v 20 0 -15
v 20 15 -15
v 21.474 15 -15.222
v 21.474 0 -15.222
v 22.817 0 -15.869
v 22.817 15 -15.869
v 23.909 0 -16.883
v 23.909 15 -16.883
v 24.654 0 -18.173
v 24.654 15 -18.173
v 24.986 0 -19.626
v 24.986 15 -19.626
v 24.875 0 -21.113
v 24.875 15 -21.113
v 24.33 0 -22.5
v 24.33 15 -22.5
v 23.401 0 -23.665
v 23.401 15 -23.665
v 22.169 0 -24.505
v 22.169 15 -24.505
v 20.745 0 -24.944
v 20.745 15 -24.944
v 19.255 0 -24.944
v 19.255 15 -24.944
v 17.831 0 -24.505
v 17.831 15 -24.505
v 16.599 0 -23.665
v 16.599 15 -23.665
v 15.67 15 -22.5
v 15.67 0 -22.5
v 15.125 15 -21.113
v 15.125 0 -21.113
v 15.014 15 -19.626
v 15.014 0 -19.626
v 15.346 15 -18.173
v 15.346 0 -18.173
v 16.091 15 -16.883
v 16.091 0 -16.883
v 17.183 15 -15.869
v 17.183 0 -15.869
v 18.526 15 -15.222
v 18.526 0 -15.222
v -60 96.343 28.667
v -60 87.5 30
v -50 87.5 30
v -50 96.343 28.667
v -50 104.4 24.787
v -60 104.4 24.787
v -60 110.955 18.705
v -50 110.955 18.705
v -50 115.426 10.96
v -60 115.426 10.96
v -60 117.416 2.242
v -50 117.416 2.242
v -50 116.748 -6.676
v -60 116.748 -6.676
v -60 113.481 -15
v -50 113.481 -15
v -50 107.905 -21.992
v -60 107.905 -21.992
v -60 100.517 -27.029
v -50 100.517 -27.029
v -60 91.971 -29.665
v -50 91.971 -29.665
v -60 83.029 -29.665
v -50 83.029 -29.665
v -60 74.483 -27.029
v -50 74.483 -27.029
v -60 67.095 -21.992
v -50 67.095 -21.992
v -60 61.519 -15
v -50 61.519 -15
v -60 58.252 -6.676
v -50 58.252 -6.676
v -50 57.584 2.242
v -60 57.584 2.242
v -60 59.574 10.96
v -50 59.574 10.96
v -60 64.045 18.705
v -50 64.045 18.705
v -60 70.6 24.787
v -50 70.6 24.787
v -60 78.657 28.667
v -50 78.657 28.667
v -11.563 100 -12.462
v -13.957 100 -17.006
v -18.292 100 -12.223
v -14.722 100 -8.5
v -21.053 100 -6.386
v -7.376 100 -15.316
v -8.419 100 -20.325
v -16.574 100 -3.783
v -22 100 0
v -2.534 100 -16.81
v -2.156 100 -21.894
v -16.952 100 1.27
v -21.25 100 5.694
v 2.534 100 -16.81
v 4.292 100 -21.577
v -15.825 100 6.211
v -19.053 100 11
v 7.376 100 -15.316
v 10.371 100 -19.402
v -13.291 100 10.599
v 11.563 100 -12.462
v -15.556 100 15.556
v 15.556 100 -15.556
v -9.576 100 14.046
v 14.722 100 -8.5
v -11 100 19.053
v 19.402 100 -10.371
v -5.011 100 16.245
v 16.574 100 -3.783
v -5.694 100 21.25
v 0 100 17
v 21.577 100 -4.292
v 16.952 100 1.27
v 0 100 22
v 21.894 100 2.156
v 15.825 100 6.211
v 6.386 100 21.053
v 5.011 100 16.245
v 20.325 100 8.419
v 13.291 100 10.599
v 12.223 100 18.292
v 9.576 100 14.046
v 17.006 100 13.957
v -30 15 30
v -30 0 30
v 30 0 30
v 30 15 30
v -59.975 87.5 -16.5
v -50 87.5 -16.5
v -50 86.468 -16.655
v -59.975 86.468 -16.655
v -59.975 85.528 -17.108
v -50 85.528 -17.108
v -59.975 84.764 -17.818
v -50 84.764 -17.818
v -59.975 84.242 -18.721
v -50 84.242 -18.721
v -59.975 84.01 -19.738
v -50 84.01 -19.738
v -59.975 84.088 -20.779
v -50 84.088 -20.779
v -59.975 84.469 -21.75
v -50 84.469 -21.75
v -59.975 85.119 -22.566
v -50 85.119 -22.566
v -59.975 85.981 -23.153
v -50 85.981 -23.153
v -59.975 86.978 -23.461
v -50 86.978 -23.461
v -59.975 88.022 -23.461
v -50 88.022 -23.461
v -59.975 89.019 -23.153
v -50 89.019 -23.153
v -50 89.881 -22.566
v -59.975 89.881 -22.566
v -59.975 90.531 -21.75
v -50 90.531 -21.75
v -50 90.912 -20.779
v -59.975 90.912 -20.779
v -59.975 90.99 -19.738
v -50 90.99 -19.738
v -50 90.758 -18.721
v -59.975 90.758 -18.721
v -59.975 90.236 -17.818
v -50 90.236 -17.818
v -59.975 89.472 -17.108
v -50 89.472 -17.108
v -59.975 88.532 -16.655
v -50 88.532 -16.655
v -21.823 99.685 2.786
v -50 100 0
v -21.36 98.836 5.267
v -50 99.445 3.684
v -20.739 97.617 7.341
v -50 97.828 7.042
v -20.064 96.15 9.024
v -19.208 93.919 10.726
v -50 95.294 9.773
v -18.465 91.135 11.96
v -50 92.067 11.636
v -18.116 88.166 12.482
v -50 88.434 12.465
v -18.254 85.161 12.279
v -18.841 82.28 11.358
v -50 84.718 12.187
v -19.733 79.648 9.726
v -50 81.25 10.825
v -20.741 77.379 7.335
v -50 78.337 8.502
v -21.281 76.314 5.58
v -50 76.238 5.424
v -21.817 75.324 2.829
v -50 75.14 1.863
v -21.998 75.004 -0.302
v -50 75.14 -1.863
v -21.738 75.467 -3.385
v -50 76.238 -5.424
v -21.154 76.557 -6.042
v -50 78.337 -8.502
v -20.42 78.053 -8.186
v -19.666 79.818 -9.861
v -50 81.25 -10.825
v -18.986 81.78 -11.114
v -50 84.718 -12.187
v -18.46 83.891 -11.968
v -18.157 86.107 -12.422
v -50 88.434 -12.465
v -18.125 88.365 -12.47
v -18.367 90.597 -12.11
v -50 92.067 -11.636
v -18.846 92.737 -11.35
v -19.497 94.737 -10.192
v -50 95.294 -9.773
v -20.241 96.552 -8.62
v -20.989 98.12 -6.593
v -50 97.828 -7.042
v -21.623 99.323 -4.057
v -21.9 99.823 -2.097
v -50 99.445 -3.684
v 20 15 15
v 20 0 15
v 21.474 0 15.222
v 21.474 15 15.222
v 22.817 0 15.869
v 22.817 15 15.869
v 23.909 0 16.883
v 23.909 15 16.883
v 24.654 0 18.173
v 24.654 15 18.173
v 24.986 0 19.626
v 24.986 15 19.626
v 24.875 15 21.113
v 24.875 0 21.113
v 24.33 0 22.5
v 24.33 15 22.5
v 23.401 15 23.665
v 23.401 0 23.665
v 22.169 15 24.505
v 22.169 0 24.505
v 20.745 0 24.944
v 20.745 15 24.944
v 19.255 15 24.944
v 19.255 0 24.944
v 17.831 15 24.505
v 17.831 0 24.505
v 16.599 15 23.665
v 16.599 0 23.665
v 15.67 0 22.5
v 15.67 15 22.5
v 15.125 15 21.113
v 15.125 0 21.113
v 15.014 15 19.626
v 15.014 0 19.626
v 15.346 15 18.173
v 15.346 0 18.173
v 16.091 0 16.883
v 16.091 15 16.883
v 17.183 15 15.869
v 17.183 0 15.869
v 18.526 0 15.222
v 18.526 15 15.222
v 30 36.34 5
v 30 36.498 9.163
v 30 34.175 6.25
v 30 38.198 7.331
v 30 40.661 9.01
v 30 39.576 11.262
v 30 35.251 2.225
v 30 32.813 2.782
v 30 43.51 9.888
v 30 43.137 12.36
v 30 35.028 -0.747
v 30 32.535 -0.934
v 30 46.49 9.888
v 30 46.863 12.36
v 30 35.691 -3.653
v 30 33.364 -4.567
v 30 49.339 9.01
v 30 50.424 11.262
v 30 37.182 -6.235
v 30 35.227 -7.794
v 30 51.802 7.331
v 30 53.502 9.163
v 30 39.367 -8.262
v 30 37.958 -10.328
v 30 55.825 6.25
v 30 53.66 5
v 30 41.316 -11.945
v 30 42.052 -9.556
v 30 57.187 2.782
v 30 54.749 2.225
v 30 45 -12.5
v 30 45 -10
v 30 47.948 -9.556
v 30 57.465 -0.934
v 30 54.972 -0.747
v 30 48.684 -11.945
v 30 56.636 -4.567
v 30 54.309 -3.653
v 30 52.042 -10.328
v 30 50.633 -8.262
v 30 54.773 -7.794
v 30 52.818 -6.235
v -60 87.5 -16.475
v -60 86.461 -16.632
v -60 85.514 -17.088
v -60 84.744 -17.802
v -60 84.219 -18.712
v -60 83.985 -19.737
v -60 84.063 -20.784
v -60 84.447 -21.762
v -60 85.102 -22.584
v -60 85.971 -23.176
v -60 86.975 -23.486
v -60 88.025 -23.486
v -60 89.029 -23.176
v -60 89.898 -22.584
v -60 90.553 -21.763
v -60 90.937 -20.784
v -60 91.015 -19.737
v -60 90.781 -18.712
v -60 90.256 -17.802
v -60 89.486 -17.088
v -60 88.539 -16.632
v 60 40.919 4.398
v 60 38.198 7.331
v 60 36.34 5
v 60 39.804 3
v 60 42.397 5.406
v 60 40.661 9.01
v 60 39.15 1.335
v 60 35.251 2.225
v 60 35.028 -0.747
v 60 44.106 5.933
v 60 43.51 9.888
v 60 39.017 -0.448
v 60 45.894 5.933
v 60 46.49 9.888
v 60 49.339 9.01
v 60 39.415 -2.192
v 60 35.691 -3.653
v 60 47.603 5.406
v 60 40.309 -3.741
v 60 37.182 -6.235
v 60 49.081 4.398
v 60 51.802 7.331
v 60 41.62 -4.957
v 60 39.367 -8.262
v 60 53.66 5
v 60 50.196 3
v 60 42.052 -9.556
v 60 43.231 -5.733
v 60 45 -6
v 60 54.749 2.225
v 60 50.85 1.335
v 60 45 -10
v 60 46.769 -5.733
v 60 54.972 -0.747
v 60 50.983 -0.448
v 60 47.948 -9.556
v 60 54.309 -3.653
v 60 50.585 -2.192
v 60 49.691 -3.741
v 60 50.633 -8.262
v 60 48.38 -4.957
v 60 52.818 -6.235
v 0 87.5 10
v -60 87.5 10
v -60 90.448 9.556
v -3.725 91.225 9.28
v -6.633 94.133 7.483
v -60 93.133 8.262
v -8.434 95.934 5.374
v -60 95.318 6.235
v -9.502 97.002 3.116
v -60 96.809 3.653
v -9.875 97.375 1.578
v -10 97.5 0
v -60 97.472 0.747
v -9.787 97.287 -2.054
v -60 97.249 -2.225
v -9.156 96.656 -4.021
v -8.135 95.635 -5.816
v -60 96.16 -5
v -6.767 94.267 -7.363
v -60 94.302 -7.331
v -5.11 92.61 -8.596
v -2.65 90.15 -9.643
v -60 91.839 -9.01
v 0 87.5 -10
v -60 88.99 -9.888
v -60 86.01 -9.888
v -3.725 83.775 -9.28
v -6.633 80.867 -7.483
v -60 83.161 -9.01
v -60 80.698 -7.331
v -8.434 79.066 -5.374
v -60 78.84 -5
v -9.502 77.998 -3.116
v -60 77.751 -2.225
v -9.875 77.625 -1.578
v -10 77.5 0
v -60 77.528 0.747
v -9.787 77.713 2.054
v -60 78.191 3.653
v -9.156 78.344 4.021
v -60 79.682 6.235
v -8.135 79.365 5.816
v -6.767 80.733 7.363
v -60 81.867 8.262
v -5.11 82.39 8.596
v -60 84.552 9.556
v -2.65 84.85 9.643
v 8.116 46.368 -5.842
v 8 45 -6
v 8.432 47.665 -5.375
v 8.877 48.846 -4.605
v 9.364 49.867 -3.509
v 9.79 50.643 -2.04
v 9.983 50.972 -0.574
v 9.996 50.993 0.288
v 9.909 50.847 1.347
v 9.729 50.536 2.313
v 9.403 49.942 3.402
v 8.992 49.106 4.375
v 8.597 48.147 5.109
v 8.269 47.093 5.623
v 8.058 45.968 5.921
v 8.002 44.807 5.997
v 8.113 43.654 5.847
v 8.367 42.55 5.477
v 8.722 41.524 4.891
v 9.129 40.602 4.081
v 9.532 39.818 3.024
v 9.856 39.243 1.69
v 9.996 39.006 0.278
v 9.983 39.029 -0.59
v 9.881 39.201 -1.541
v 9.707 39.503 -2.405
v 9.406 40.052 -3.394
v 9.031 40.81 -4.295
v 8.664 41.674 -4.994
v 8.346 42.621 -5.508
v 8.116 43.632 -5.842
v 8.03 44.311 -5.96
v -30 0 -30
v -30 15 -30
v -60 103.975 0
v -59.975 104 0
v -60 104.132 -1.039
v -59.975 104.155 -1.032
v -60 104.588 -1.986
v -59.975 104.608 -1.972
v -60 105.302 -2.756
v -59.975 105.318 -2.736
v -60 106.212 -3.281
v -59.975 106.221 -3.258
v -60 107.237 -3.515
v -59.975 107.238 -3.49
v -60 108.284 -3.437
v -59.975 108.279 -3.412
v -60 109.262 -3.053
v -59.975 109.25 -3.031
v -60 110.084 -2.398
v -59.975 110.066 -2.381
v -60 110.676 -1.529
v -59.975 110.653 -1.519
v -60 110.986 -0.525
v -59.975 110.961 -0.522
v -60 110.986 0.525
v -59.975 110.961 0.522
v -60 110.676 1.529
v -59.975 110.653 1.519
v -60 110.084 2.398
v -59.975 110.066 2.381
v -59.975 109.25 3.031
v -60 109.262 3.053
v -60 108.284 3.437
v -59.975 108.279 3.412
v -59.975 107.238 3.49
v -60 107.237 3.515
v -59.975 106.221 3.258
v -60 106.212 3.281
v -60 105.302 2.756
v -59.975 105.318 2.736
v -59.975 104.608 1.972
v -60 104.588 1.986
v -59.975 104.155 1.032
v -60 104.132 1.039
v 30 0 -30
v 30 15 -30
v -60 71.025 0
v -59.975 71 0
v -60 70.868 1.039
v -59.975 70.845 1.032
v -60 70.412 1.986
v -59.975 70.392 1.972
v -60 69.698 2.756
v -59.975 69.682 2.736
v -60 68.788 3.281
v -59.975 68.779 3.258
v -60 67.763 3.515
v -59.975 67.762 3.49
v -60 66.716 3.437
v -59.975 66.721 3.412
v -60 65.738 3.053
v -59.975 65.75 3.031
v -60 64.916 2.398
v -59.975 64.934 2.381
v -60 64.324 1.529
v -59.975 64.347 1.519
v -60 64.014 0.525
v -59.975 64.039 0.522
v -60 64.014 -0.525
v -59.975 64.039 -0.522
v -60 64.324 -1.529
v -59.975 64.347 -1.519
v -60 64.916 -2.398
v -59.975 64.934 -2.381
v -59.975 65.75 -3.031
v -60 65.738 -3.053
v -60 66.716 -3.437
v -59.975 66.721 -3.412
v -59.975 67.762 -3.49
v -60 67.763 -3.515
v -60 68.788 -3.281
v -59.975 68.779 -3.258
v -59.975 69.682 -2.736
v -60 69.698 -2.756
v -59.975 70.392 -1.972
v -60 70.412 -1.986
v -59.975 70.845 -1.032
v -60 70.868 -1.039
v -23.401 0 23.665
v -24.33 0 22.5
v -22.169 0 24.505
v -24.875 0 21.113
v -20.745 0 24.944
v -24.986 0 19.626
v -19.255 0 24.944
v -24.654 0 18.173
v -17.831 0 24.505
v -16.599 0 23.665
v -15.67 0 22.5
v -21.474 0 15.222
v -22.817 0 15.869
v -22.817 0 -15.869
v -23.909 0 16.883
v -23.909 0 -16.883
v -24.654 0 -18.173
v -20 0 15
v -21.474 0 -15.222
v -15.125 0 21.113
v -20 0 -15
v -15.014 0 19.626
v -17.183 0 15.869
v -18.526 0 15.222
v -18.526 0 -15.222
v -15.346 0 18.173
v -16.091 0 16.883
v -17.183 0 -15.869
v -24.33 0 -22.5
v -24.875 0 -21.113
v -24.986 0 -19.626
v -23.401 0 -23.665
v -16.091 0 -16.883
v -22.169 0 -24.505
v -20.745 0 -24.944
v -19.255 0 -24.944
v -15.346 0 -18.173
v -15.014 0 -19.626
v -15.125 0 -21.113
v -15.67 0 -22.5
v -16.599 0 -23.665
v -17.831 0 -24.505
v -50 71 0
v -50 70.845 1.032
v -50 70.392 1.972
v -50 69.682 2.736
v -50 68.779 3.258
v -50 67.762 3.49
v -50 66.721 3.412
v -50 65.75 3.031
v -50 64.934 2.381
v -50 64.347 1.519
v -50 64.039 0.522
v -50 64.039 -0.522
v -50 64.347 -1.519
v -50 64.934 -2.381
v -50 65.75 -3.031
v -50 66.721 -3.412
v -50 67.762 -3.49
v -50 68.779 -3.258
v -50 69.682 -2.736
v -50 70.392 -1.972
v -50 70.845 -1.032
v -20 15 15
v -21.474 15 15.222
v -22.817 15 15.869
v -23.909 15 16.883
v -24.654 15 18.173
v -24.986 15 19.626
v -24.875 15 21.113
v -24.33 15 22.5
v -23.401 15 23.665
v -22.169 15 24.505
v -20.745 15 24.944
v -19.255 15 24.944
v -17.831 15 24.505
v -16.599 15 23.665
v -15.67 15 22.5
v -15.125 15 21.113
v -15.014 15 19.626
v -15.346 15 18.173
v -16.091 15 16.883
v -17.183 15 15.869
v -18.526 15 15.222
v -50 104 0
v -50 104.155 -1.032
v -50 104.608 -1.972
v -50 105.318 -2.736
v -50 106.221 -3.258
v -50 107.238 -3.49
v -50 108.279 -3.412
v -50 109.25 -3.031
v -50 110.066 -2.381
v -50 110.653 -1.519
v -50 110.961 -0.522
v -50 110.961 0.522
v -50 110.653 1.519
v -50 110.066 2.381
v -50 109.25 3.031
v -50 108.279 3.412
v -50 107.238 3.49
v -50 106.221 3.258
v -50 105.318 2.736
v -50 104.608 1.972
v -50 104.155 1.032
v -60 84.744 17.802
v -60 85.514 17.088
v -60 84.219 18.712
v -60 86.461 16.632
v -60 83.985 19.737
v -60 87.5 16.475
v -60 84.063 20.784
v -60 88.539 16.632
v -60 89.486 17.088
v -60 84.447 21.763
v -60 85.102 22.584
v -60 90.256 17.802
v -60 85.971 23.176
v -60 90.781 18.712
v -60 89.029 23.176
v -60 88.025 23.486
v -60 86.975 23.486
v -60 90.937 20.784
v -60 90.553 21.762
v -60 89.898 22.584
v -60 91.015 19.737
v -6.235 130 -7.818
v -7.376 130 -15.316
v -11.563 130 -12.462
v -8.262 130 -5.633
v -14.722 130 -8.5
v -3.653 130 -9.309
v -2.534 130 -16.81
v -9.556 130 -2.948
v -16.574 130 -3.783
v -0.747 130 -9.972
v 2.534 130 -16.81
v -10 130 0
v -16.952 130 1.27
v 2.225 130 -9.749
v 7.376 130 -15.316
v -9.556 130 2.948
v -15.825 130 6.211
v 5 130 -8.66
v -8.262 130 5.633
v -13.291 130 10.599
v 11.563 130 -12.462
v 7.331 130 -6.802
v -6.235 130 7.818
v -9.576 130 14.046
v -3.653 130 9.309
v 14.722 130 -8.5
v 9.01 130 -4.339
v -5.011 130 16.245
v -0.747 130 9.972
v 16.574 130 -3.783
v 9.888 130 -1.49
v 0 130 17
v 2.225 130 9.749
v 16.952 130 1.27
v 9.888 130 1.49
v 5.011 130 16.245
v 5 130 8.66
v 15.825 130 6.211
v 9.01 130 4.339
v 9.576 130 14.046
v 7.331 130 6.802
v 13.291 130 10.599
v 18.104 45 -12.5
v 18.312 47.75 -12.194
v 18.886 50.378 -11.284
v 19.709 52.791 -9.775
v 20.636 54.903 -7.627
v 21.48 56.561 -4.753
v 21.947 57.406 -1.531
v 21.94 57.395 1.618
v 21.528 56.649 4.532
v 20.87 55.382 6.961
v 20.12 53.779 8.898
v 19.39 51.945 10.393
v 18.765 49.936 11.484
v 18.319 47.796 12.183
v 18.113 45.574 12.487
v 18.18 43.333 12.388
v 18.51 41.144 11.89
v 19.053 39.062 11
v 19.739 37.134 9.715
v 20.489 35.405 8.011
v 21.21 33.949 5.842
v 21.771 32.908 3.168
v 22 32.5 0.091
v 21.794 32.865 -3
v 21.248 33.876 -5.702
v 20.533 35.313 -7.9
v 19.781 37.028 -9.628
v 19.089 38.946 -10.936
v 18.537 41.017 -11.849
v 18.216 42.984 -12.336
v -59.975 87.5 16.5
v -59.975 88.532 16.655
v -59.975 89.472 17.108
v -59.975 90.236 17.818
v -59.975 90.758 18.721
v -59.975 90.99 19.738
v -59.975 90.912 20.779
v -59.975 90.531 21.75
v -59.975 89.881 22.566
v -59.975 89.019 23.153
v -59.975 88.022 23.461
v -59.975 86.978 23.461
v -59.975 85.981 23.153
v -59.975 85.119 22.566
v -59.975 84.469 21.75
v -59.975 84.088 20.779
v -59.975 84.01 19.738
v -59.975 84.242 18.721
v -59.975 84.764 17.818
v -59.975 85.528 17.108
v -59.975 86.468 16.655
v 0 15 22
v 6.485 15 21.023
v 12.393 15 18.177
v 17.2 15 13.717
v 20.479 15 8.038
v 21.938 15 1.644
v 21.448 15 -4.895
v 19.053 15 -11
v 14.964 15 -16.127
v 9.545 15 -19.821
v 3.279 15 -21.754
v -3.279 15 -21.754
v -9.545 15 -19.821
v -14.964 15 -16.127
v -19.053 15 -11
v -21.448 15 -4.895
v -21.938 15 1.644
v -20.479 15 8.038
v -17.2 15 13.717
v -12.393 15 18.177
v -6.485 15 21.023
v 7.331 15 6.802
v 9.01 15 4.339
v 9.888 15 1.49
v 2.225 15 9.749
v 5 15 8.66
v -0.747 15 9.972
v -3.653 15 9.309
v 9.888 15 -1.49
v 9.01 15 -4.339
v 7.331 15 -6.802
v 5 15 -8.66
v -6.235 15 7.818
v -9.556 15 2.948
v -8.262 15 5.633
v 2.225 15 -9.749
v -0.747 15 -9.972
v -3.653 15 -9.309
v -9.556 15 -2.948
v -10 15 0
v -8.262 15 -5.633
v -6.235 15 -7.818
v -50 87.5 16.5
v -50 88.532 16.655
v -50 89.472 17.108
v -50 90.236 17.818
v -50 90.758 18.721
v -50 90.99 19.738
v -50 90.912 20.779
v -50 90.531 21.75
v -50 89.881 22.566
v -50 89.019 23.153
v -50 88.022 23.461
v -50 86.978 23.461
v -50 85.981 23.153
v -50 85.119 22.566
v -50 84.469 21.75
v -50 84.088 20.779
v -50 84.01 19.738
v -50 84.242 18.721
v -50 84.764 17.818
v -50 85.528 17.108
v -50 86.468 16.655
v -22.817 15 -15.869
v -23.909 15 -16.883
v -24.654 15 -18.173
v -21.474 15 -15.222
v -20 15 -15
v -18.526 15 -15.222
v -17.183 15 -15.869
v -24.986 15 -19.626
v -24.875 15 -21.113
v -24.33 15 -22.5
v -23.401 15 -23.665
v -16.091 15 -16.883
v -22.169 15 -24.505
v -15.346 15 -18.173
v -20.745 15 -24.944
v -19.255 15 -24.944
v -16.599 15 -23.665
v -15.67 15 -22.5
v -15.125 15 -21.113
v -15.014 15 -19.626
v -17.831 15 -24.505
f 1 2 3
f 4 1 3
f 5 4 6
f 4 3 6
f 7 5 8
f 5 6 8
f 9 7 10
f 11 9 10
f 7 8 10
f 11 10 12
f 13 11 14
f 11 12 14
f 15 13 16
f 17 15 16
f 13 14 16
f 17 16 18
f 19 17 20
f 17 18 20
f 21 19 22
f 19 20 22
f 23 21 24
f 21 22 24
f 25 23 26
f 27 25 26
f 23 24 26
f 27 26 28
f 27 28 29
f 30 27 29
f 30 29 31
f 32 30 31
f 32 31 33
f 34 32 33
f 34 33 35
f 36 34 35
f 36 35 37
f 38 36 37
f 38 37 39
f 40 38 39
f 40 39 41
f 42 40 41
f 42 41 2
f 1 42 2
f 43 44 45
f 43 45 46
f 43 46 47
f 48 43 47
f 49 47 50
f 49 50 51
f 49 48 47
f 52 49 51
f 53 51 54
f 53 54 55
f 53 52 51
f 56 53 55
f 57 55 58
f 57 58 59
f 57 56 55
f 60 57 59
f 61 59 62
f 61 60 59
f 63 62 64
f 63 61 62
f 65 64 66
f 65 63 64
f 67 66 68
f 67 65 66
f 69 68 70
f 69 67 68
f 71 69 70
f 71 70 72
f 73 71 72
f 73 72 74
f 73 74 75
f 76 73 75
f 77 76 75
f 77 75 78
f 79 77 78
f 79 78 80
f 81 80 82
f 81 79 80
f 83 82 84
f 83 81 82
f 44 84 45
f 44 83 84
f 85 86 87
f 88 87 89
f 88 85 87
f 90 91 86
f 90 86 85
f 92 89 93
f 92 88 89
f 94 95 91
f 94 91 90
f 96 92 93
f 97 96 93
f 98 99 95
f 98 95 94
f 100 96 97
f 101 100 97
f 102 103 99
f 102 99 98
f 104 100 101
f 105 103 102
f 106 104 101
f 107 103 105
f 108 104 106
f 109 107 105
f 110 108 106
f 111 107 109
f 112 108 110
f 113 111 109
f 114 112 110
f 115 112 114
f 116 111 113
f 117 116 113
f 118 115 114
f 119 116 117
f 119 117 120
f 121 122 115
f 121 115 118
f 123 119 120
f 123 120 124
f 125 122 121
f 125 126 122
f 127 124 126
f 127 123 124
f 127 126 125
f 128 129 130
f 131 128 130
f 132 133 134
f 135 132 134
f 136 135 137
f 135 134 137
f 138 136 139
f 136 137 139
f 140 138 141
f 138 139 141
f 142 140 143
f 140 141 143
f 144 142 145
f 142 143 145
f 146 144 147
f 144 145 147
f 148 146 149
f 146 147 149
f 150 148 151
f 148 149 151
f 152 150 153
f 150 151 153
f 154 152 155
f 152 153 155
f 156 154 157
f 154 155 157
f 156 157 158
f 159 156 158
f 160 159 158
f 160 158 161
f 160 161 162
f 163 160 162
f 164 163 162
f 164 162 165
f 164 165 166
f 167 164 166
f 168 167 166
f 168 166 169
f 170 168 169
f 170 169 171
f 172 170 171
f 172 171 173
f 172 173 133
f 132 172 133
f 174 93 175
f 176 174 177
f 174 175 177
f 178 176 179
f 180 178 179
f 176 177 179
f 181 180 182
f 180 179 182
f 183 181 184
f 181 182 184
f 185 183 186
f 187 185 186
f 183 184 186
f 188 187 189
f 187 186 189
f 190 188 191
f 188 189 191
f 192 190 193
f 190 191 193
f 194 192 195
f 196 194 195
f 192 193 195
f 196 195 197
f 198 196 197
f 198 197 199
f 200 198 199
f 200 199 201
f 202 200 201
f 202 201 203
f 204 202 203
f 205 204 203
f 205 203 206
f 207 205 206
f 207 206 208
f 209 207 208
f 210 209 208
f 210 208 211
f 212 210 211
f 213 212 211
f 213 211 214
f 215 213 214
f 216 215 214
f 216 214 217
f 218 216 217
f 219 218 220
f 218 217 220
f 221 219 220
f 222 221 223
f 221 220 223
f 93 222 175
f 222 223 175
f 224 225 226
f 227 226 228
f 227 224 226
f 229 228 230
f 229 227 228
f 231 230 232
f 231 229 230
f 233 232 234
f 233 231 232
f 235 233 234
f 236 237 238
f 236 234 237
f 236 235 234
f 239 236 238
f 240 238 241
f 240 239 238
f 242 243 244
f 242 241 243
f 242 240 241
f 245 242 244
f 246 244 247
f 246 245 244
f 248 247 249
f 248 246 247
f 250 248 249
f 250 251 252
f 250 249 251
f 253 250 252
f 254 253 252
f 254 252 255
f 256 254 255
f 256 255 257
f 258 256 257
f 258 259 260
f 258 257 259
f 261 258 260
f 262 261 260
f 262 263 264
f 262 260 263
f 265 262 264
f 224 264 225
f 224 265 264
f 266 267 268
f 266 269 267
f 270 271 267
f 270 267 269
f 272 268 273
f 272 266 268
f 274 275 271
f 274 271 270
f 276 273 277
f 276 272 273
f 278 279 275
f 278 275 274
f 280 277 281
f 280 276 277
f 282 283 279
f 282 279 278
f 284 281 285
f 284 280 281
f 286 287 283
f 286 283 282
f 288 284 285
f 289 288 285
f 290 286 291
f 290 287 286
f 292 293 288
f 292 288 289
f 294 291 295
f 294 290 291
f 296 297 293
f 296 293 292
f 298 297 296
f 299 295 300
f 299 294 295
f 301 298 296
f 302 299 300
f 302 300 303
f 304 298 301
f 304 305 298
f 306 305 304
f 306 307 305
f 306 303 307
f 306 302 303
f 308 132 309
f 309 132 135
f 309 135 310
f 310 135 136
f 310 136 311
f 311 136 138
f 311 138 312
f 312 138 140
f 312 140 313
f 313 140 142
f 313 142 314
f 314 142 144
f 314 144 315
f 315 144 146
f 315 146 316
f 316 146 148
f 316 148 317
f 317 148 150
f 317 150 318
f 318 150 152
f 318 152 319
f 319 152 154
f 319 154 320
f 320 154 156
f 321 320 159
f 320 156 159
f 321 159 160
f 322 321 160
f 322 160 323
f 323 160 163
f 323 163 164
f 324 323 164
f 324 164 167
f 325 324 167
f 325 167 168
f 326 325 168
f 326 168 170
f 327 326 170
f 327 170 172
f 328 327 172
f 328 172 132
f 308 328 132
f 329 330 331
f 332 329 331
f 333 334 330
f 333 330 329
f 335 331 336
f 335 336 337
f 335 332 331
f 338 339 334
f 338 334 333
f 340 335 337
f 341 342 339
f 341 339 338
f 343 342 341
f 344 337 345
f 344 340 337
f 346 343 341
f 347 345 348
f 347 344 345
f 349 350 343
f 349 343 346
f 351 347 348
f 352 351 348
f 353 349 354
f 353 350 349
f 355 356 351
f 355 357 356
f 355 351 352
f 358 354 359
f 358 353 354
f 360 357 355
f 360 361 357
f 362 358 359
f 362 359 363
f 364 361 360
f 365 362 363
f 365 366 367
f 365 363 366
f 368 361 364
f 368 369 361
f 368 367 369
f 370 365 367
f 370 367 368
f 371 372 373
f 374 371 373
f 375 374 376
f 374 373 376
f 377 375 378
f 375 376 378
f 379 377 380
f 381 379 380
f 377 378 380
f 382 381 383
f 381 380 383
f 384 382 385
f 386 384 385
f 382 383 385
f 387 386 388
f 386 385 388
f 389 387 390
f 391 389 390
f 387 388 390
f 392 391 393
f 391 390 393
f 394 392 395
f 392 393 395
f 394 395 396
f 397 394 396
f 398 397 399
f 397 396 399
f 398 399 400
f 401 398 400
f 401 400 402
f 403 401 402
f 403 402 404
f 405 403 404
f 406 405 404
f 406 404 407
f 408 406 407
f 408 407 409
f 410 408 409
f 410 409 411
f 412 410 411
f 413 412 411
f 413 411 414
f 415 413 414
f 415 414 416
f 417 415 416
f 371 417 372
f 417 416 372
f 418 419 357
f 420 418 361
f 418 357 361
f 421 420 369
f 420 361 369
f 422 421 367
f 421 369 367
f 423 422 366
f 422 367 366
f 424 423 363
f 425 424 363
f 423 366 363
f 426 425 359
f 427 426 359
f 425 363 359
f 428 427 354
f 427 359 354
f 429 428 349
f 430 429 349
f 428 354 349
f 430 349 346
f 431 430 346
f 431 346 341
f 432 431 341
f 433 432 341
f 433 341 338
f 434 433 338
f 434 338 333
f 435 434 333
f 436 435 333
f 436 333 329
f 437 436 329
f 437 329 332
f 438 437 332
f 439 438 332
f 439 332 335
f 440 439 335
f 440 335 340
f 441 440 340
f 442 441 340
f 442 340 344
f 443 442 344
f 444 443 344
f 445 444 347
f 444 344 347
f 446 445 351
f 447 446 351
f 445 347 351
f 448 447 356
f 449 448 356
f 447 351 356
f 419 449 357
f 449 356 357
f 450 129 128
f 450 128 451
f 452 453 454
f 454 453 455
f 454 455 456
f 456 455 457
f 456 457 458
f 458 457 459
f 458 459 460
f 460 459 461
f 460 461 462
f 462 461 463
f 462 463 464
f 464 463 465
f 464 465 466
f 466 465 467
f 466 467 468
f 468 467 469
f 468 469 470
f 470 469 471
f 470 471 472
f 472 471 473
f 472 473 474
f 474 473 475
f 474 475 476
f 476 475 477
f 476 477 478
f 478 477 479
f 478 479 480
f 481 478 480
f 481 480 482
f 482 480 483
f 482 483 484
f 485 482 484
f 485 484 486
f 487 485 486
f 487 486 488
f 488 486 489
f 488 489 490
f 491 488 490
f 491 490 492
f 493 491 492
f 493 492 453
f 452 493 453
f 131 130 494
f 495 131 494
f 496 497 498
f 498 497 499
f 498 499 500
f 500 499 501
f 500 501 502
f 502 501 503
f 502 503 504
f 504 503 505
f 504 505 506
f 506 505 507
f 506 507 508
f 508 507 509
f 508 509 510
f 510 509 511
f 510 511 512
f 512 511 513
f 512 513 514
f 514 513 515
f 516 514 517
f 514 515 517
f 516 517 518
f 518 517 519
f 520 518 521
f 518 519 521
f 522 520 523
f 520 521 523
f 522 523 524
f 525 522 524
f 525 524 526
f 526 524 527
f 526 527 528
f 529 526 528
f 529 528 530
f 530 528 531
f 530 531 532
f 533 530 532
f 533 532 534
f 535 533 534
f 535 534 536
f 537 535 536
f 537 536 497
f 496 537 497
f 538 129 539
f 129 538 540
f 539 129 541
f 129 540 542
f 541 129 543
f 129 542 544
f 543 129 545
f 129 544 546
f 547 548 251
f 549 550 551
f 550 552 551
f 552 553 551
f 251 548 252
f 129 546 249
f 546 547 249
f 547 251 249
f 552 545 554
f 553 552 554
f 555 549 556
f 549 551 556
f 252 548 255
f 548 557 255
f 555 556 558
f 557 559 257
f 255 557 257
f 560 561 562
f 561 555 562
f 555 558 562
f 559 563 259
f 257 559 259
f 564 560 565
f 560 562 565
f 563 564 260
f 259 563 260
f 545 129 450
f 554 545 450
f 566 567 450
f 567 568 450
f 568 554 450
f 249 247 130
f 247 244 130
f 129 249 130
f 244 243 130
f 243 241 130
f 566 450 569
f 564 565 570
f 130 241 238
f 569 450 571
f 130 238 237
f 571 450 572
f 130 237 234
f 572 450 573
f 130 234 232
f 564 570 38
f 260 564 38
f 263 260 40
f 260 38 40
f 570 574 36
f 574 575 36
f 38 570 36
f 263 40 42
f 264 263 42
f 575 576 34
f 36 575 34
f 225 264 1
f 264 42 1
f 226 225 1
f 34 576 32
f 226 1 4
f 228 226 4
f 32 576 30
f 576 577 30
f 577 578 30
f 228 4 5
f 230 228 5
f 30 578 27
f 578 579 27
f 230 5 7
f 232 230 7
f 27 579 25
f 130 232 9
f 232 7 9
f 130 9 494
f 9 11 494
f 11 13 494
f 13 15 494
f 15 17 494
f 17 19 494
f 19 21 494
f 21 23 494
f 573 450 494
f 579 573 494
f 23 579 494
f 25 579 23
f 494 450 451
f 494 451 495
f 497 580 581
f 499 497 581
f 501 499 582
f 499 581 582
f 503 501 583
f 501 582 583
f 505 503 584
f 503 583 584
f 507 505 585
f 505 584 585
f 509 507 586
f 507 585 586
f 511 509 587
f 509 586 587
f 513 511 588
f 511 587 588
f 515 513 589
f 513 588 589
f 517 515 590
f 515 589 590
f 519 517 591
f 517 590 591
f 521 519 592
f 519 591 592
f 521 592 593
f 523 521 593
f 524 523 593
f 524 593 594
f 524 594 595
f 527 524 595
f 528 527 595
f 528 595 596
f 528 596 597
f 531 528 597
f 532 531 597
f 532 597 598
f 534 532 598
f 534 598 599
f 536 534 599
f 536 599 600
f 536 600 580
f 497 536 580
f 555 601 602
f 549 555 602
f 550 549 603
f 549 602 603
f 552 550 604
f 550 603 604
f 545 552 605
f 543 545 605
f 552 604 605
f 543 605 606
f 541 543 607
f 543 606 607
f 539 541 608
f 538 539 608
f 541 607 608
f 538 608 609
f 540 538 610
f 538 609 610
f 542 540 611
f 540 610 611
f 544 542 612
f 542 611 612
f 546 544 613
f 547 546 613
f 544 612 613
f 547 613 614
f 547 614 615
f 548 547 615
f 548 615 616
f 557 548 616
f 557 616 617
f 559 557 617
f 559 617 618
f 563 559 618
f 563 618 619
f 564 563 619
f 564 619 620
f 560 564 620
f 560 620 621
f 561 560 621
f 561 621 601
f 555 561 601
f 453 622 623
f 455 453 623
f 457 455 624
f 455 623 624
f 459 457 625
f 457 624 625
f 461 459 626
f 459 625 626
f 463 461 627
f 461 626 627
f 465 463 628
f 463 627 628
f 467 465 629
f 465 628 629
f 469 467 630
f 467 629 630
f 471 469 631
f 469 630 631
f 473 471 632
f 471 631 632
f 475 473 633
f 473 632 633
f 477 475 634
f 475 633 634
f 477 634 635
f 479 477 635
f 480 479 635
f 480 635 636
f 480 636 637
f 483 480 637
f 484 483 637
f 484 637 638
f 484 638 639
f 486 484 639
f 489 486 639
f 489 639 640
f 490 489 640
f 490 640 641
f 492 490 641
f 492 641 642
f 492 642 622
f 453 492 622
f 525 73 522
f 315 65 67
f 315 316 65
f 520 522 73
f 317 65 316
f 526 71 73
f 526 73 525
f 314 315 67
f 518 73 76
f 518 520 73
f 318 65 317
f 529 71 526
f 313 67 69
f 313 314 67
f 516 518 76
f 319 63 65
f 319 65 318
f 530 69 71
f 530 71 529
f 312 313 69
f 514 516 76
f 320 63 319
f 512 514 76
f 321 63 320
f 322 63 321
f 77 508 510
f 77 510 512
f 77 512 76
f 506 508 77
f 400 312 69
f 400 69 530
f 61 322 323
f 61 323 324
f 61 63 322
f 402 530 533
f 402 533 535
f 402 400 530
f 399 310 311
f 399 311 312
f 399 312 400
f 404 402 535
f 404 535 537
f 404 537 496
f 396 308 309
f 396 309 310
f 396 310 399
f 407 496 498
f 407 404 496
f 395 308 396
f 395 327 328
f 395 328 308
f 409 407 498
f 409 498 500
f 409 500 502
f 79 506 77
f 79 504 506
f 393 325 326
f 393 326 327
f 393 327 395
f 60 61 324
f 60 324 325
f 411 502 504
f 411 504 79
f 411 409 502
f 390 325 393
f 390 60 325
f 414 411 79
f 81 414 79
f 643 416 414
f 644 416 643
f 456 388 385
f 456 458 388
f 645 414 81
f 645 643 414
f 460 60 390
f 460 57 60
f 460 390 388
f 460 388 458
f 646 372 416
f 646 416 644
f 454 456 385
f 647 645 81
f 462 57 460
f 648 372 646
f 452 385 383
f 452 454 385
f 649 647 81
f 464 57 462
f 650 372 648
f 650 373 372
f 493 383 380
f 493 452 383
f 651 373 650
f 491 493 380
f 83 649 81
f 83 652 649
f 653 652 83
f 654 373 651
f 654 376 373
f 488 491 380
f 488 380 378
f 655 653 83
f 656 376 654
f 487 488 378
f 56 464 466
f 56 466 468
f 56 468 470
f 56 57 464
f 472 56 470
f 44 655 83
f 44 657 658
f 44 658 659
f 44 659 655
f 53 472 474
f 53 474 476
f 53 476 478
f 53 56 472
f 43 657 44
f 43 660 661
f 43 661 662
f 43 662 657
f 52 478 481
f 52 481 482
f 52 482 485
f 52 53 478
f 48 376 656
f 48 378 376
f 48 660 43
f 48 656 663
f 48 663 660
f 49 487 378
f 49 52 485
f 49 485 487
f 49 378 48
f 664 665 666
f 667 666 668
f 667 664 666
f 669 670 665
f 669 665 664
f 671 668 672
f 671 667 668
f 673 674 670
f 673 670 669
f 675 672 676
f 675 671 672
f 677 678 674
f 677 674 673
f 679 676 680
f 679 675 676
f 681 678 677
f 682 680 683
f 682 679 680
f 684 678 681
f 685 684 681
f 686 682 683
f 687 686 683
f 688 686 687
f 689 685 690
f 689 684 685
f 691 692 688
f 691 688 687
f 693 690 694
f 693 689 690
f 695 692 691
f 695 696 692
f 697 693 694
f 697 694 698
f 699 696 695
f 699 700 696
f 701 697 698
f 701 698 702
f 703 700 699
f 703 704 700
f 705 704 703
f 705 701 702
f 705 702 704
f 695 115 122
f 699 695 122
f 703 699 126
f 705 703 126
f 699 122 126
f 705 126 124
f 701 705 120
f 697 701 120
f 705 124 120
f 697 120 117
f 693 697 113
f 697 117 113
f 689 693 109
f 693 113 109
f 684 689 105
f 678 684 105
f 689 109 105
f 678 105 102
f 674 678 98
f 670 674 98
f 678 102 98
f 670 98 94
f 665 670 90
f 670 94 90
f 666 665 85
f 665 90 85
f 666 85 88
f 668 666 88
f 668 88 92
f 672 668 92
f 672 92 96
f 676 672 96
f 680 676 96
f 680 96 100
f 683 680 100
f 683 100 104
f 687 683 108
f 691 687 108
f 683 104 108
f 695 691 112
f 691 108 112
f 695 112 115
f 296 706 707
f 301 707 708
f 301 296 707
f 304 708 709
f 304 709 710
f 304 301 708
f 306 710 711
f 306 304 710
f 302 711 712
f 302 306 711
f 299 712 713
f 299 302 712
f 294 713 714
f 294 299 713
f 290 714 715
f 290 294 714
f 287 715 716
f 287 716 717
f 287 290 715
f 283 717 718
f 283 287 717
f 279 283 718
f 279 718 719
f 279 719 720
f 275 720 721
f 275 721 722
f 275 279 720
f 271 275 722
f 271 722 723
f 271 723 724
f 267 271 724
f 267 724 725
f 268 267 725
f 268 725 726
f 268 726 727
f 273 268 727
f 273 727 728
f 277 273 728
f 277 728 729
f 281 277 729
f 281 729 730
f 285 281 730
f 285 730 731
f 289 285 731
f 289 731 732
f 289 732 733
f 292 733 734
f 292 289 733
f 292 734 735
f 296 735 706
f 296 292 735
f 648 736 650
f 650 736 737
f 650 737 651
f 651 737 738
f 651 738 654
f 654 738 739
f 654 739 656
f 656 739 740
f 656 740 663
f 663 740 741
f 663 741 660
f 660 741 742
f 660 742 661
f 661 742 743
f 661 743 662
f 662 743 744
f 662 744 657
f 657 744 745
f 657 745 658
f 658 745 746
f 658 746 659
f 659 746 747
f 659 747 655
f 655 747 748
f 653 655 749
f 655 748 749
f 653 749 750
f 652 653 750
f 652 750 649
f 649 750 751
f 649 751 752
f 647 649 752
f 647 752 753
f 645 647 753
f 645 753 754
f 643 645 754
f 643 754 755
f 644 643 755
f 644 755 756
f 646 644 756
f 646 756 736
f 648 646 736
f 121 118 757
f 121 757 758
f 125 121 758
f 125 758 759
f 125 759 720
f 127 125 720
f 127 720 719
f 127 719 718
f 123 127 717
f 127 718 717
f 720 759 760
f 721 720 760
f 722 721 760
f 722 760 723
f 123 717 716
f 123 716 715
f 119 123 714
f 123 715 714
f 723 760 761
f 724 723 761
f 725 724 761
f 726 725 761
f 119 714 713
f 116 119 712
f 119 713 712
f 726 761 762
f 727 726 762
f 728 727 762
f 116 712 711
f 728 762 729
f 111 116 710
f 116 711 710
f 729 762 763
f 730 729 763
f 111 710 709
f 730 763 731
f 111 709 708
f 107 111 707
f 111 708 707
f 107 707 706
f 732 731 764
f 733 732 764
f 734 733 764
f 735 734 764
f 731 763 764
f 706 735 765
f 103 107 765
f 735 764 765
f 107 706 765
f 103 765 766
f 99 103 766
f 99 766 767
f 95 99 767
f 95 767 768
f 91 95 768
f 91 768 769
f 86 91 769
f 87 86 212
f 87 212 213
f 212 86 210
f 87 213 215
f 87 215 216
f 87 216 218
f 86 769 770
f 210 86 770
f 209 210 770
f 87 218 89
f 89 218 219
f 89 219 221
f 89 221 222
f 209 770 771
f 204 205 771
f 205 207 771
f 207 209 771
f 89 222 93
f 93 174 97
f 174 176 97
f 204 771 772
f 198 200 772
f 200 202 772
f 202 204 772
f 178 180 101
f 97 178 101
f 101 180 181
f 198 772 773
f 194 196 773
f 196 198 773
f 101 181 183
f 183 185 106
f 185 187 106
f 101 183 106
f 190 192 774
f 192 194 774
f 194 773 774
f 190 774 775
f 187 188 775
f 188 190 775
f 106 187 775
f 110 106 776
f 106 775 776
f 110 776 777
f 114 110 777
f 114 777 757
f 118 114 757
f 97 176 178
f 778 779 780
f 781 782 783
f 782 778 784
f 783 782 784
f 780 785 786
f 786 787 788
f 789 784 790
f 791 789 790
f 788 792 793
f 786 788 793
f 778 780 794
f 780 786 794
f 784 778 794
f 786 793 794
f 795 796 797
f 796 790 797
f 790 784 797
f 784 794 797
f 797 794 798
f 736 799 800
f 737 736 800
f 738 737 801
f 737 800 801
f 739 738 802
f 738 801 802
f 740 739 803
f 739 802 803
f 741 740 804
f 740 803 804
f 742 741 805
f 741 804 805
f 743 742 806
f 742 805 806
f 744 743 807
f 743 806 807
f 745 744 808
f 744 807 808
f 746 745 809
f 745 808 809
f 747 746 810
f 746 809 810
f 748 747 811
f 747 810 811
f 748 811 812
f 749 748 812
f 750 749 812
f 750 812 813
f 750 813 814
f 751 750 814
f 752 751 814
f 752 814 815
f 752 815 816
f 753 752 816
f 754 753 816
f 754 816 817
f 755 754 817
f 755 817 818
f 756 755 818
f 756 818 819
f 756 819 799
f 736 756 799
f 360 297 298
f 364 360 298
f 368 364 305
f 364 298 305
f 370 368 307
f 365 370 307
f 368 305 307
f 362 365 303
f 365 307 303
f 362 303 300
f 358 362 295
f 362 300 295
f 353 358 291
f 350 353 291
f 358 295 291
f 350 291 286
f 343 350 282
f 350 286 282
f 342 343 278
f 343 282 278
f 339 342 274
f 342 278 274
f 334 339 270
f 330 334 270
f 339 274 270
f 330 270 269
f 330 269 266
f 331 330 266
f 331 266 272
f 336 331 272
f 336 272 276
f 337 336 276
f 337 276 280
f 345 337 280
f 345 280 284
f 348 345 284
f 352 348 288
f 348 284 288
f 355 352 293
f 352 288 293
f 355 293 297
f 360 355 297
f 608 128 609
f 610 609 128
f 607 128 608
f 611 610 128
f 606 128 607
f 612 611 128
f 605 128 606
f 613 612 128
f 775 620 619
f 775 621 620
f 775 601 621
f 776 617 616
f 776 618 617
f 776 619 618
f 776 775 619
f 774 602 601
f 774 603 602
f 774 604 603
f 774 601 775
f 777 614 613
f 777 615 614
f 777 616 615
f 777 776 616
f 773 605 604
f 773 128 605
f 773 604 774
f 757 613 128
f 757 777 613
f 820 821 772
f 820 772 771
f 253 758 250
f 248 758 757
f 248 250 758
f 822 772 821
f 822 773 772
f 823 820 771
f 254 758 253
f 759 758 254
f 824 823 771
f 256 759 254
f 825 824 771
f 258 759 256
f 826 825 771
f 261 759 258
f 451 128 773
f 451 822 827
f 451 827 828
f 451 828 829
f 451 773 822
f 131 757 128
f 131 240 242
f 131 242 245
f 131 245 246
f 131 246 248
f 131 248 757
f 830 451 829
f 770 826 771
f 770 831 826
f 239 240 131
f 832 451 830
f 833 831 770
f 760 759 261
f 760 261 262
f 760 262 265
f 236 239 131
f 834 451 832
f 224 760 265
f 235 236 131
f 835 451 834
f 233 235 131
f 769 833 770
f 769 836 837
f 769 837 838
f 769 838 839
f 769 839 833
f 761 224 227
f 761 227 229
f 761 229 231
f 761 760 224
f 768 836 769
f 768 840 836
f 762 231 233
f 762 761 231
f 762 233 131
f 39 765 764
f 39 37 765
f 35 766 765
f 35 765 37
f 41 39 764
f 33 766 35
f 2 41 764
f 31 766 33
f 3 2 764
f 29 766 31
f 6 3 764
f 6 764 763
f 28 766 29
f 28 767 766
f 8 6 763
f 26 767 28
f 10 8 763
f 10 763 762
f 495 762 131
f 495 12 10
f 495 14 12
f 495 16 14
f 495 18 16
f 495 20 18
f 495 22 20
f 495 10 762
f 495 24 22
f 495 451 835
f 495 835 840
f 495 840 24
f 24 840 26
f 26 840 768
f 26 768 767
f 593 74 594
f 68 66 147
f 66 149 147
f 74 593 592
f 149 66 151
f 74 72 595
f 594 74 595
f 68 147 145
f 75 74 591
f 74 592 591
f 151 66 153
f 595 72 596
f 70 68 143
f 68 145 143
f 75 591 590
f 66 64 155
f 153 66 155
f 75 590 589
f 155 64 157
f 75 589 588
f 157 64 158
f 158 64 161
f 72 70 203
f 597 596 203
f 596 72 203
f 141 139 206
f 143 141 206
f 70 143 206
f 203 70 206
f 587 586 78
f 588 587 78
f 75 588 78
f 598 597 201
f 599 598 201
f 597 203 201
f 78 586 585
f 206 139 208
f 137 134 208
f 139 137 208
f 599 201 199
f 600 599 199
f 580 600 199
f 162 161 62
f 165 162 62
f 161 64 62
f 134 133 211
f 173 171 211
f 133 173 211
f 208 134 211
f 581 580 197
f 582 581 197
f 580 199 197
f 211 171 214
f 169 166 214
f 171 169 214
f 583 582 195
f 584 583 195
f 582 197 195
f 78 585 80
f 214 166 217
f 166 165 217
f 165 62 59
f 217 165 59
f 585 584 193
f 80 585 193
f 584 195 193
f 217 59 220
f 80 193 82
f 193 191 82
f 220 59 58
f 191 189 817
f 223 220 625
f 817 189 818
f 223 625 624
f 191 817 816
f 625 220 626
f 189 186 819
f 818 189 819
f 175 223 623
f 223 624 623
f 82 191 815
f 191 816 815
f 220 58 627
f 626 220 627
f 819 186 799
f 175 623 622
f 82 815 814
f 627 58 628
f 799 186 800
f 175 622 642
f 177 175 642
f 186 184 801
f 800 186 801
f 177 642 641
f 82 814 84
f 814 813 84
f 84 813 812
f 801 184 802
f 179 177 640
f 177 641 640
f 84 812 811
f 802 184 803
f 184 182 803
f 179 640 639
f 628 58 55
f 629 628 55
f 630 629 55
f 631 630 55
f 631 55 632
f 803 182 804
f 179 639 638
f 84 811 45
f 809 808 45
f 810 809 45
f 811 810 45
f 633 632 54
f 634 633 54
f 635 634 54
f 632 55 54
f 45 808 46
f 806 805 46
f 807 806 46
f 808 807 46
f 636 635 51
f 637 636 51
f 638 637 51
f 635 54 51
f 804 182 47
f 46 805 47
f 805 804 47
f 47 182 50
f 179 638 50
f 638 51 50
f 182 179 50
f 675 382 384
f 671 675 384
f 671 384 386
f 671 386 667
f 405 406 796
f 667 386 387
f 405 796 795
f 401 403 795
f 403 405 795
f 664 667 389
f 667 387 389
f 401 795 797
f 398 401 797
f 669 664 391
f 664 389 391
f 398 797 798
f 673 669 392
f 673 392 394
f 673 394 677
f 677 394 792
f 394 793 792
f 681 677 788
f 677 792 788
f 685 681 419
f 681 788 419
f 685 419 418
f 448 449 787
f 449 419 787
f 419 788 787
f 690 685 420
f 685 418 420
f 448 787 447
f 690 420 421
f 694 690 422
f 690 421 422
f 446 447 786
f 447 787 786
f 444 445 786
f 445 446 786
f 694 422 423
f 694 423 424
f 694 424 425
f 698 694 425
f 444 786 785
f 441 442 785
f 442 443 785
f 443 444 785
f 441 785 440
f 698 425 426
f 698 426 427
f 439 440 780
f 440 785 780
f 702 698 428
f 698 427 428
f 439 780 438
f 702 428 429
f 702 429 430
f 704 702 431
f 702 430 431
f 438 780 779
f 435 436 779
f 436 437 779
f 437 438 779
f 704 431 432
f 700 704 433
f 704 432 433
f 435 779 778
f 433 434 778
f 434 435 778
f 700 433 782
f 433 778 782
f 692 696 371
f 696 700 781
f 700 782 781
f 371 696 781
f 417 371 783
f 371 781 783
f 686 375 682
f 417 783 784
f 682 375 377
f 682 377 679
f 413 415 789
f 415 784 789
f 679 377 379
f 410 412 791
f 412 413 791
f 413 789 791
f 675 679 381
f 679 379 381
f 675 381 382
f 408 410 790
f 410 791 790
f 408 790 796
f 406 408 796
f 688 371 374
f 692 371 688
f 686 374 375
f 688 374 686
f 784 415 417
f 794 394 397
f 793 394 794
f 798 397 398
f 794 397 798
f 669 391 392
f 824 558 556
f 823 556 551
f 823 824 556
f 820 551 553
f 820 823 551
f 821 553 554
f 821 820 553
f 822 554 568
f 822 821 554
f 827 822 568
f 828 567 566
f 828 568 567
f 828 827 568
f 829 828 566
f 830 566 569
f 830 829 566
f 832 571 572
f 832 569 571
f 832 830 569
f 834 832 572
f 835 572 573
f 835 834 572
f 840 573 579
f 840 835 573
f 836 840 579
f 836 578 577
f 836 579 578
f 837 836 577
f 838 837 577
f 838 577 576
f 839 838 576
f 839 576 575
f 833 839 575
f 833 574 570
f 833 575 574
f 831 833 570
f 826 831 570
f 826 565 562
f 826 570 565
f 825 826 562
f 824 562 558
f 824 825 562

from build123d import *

# Parameters (mm, degrees)
SKETCH1_W                             = 60
SKETCH1_H                             = 60
BOSS_EXTRUDE1_DEPTH                   = 15
SKETCH2_R                             = 22
BOSS_EXTRUDE2_DEPTH                   = 85
SKETCH3_R                             = 17
BOSS_EXTRUDE3_DEPTH                   = 30
HOLE1_D                               = 20
HOLE1_DEPTH                           = 115
SKETCH9_R                             = 5
CUT_EXTRUDE1_DEPTH                    = 123.576506721
MIRROR2_COPY_1_SKETCH_R               = 5
MIRROR2_COPY_1_DEPTH                  = 123.576506721
BOSS_EXTRUDE4_REACH                   = 162.935
BOSS_EXTRUDE4_END_RADIUS              = 22
SKETCH10_R                            = 12.5
SKETCH11_R                            = 30
BOSS_EXTRUDE5_DEPTH                   = 10
HOLE2_REACH                           = 162.935
HOLE2_BORE_R                          = 10
TAP_DRILL_FOR_M8X1_0_TAP1_D           = 7
TAP_DRILL_FOR_M8X1_0_TAP1_DEPTH       = 10
TAP_DRILL_FOR_M8X1_0_TAP1_CSINK_D     = 7.05
TAP_DRILL_FOR_M8X1_0_TAP1_CSINK_ANGLE = 90
CIRPATTERN1_COUNT                     = 4
BOSS_EXTRUDE6_REACH                   = 211.444
BOSS_EXTRUDE6_END_RADIUS              = 22
BOSS_EXTRUDE6_START                   = -30
SKETCH18_R                            = 12.5
SKETCH20_R                            = 10
BOSS_EXTRUDE7_DEPTH                   = 30
HOLE3_REACH                           = 181.444
HOLE3_BORE_R                          = 6


with BuildPart() as part:
    # Sketch1 → Boss-Extrude1 (new body)
    with BuildSketch(Plane(origin=(0, 0, 0), x_dir=(1, 0, 0), z_dir=(0, 1, 0))):
        Rectangle(SKETCH1_W, SKETCH1_H)
    extrude(amount=BOSS_EXTRUDE1_DEPTH)

    # Sketch2 → Boss-Extrude2 (add)
    with BuildSketch(Plane(origin=(0, 15, 0), x_dir=(1, 0, 0), z_dir=(0, 1, 0))):
        with Locations(Location((0, 0, 0), (0, 0, 270))):
            Circle(SKETCH2_R)
    extrude(amount=BOSS_EXTRUDE2_DEPTH)

    # Sketch3 → Boss-Extrude3 (add)
    with BuildSketch(Plane(origin=(0, 100, 0), x_dir=(1, 0, 0), z_dir=(0, 1, 0))):
        with Locations(Location((0, 0, 0), (0, 0, 270))):
            Circle(SKETCH3_R)
    extrude(amount=BOSS_EXTRUDE3_DEPTH)

    # Hole1
    with Locations(Plane(origin=(0, 130, 0), x_dir=(1, 0, 0), z_dir=(0, 1, 0))):
        with Locations((0, 0)):
            Hole(HOLE1_D / 2, depth=HOLE1_DEPTH)

    # Sketch9 → Cut-Extrude1 (cut, through all)
    with BuildSketch(Plane(origin=(0, 15, 0), x_dir=(1, 0, 0), z_dir=(0, 1, 0))):
        with Locations(Location((20, 20, 0), (0, 0, 270))):
            Circle(SKETCH9_R)
    cut_extrude1 = extrude(amount=-CUT_EXTRUDE1_DEPTH, mode=Mode.SUBTRACT)

    # Mirror1: Cut-Extrude1 across plane
    add(cut_extrude1.mirror(Plane(origin=(0, 0, 0), x_dir=(0, 0, 1), z_dir=(1, 0, 0))), mode=Mode.SUBTRACT)

    # Mirror2: Cut-Extrude1 across plane
    add(cut_extrude1.mirror(Plane.XY), mode=Mode.SUBTRACT)

    # Mirror2 copy 1 sketch → Mirror2 copy 1 (cut, through all)
    with BuildSketch(Plane(origin=(0, 15, 0), x_dir=(-1, 0, 0), z_dir=(0, 1, 0))):
        with Locations(Location((20, 20, 0), (0, 0, 270))):
            Circle(MIRROR2_COPY_1_SKETCH_R)
    extrude(amount=-MIRROR2_COPY_1_DEPTH, mode=Mode.SUBTRACT)

    # Boss-Extrude4: up to this cylinder (the profile starts outside it)
    boss_extrude4_end = Plane(origin=(0, 87.5, 0), z_dir=(0, -1, 0)) * Cylinder(BOSS_EXTRUDE4_END_RADIUS, 370.87, mode=Mode.PRIVATE)
    # Sketch10 → Boss-Extrude4 (add, up to the surface)
    with BuildSketch(Plane(origin=(-60, 0, 0), x_dir=(0, 0, -1), z_dir=(1, 0, 0)), mode=Mode.PRIVATE) as boss_extrude4_sk1:
        with Locations(Location((0, 87.5, 0), (0, 0, 90))):
            Circle(SKETCH10_R)
    boss_extrude4_tool1 = extrude(boss_extrude4_sk1.sketch, amount=BOSS_EXTRUDE4_REACH, mode=Mode.PRIVATE) - boss_extrude4_end
    add(boss_extrude4_tool1.solids().sort_by_distance((-60, 87.5, 0))[0])

    # Sketch11 → Boss-Extrude5 (add)
    with BuildSketch(Plane.ZY.offset(60)):
        with Locations((0, 87.5)):
            Circle(SKETCH11_R)
    extrude(amount=-BOSS_EXTRUDE5_DEPTH)

    # Hole2 bore → Hole2 (cut, up to next)
    with BuildSketch(Plane.ZY.offset(60), mode=Mode.PRIVATE) as hole2_sk1:
        with Locations((0, 87.5)):
            Circle(HOLE2_BORE_R)
    hole2_tool1 = extrude(hole2_sk1.sketch, amount=-HOLE2_REACH, mode=Mode.PRIVATE) & part.part
    add(hole2_tool1.solids().sort_by_distance((-60, 87.5, 0))[0], mode=Mode.SUBTRACT)

    # Tap Drill for M8x1.0 Tap1
    with Locations(Plane.ZY.offset(60)):
        with Locations((20, 87.5)):
            tap_drill_for_m8x1_0_tap1 = CounterSinkHole(TAP_DRILL_FOR_M8X1_0_TAP1_D / 2, TAP_DRILL_FOR_M8X1_0_TAP1_CSINK_D / 2, depth=TAP_DRILL_FOR_M8X1_0_TAP1_DEPTH, counter_sink_angle=TAP_DRILL_FOR_M8X1_0_TAP1_CSINK_ANGLE)

    # CirPattern1: Tap Drill for M8x1.0 Tap1 ×4 about axis
    cirpattern1_axis = Axis((0, 87.5, 0), (1, 0, 0))
    for i in range(1, CIRPATTERN1_COUNT):
        add(tap_drill_for_m8x1_0_tap1.rotate(cirpattern1_axis, i * 360 / CIRPATTERN1_COUNT), mode=Mode.SUBTRACT)

    # Boss-Extrude6: up to this cylinder (the profile starts outside it)
    boss_extrude6_end = Plane(origin=(0, 45, 0), z_dir=(0, -1, 0)) * Cylinder(BOSS_EXTRUDE6_END_RADIUS, 467.888, mode=Mode.PRIVATE)
    # Sketch18 → Boss-Extrude6 (add, up to the surface)
    with BuildSketch(Plane(origin=(60, 0, 0), x_dir=(0, 0, -1), z_dir=(1, 0, 0)).offset(BOSS_EXTRUDE6_START), mode=Mode.PRIVATE) as boss_extrude6_sk1:
        with Locations((0, 45)):
            Circle(SKETCH18_R)
    boss_extrude6_tool1 = extrude(boss_extrude6_sk1.sketch, amount=-BOSS_EXTRUDE6_REACH, mode=Mode.PRIVATE) - boss_extrude6_end
    add(boss_extrude6_tool1.solids().sort_by_distance((30, 45, 0))[0])

    # Sketch20 → Boss-Extrude7 (add)
    with BuildSketch(Plane(origin=(30, 0, 0), x_dir=(0, 0, -1), z_dir=(1, 0, 0))):
        with Locations((0, 45)):
            Circle(SKETCH20_R)
    extrude(amount=BOSS_EXTRUDE7_DEPTH)

    # Hole3 bore → Hole3 (cut, up to next)
    with BuildSketch(Plane(origin=(60, 0, 0), x_dir=(0, 0, -1), z_dir=(1, 0, 0)), mode=Mode.PRIVATE) as hole3_sk1:
        with Locations((0, 45)):
            Circle(HOLE3_BORE_R)
    hole3_tool1 = extrude(hole3_sk1.sketch, amount=-HOLE3_REACH, mode=Mode.PRIVATE) & part.part
    add(hole3_tool1.solids().sort_by_distance((60, 45, 0))[0], mode=Mode.SUBTRACT)


solid = part.part
